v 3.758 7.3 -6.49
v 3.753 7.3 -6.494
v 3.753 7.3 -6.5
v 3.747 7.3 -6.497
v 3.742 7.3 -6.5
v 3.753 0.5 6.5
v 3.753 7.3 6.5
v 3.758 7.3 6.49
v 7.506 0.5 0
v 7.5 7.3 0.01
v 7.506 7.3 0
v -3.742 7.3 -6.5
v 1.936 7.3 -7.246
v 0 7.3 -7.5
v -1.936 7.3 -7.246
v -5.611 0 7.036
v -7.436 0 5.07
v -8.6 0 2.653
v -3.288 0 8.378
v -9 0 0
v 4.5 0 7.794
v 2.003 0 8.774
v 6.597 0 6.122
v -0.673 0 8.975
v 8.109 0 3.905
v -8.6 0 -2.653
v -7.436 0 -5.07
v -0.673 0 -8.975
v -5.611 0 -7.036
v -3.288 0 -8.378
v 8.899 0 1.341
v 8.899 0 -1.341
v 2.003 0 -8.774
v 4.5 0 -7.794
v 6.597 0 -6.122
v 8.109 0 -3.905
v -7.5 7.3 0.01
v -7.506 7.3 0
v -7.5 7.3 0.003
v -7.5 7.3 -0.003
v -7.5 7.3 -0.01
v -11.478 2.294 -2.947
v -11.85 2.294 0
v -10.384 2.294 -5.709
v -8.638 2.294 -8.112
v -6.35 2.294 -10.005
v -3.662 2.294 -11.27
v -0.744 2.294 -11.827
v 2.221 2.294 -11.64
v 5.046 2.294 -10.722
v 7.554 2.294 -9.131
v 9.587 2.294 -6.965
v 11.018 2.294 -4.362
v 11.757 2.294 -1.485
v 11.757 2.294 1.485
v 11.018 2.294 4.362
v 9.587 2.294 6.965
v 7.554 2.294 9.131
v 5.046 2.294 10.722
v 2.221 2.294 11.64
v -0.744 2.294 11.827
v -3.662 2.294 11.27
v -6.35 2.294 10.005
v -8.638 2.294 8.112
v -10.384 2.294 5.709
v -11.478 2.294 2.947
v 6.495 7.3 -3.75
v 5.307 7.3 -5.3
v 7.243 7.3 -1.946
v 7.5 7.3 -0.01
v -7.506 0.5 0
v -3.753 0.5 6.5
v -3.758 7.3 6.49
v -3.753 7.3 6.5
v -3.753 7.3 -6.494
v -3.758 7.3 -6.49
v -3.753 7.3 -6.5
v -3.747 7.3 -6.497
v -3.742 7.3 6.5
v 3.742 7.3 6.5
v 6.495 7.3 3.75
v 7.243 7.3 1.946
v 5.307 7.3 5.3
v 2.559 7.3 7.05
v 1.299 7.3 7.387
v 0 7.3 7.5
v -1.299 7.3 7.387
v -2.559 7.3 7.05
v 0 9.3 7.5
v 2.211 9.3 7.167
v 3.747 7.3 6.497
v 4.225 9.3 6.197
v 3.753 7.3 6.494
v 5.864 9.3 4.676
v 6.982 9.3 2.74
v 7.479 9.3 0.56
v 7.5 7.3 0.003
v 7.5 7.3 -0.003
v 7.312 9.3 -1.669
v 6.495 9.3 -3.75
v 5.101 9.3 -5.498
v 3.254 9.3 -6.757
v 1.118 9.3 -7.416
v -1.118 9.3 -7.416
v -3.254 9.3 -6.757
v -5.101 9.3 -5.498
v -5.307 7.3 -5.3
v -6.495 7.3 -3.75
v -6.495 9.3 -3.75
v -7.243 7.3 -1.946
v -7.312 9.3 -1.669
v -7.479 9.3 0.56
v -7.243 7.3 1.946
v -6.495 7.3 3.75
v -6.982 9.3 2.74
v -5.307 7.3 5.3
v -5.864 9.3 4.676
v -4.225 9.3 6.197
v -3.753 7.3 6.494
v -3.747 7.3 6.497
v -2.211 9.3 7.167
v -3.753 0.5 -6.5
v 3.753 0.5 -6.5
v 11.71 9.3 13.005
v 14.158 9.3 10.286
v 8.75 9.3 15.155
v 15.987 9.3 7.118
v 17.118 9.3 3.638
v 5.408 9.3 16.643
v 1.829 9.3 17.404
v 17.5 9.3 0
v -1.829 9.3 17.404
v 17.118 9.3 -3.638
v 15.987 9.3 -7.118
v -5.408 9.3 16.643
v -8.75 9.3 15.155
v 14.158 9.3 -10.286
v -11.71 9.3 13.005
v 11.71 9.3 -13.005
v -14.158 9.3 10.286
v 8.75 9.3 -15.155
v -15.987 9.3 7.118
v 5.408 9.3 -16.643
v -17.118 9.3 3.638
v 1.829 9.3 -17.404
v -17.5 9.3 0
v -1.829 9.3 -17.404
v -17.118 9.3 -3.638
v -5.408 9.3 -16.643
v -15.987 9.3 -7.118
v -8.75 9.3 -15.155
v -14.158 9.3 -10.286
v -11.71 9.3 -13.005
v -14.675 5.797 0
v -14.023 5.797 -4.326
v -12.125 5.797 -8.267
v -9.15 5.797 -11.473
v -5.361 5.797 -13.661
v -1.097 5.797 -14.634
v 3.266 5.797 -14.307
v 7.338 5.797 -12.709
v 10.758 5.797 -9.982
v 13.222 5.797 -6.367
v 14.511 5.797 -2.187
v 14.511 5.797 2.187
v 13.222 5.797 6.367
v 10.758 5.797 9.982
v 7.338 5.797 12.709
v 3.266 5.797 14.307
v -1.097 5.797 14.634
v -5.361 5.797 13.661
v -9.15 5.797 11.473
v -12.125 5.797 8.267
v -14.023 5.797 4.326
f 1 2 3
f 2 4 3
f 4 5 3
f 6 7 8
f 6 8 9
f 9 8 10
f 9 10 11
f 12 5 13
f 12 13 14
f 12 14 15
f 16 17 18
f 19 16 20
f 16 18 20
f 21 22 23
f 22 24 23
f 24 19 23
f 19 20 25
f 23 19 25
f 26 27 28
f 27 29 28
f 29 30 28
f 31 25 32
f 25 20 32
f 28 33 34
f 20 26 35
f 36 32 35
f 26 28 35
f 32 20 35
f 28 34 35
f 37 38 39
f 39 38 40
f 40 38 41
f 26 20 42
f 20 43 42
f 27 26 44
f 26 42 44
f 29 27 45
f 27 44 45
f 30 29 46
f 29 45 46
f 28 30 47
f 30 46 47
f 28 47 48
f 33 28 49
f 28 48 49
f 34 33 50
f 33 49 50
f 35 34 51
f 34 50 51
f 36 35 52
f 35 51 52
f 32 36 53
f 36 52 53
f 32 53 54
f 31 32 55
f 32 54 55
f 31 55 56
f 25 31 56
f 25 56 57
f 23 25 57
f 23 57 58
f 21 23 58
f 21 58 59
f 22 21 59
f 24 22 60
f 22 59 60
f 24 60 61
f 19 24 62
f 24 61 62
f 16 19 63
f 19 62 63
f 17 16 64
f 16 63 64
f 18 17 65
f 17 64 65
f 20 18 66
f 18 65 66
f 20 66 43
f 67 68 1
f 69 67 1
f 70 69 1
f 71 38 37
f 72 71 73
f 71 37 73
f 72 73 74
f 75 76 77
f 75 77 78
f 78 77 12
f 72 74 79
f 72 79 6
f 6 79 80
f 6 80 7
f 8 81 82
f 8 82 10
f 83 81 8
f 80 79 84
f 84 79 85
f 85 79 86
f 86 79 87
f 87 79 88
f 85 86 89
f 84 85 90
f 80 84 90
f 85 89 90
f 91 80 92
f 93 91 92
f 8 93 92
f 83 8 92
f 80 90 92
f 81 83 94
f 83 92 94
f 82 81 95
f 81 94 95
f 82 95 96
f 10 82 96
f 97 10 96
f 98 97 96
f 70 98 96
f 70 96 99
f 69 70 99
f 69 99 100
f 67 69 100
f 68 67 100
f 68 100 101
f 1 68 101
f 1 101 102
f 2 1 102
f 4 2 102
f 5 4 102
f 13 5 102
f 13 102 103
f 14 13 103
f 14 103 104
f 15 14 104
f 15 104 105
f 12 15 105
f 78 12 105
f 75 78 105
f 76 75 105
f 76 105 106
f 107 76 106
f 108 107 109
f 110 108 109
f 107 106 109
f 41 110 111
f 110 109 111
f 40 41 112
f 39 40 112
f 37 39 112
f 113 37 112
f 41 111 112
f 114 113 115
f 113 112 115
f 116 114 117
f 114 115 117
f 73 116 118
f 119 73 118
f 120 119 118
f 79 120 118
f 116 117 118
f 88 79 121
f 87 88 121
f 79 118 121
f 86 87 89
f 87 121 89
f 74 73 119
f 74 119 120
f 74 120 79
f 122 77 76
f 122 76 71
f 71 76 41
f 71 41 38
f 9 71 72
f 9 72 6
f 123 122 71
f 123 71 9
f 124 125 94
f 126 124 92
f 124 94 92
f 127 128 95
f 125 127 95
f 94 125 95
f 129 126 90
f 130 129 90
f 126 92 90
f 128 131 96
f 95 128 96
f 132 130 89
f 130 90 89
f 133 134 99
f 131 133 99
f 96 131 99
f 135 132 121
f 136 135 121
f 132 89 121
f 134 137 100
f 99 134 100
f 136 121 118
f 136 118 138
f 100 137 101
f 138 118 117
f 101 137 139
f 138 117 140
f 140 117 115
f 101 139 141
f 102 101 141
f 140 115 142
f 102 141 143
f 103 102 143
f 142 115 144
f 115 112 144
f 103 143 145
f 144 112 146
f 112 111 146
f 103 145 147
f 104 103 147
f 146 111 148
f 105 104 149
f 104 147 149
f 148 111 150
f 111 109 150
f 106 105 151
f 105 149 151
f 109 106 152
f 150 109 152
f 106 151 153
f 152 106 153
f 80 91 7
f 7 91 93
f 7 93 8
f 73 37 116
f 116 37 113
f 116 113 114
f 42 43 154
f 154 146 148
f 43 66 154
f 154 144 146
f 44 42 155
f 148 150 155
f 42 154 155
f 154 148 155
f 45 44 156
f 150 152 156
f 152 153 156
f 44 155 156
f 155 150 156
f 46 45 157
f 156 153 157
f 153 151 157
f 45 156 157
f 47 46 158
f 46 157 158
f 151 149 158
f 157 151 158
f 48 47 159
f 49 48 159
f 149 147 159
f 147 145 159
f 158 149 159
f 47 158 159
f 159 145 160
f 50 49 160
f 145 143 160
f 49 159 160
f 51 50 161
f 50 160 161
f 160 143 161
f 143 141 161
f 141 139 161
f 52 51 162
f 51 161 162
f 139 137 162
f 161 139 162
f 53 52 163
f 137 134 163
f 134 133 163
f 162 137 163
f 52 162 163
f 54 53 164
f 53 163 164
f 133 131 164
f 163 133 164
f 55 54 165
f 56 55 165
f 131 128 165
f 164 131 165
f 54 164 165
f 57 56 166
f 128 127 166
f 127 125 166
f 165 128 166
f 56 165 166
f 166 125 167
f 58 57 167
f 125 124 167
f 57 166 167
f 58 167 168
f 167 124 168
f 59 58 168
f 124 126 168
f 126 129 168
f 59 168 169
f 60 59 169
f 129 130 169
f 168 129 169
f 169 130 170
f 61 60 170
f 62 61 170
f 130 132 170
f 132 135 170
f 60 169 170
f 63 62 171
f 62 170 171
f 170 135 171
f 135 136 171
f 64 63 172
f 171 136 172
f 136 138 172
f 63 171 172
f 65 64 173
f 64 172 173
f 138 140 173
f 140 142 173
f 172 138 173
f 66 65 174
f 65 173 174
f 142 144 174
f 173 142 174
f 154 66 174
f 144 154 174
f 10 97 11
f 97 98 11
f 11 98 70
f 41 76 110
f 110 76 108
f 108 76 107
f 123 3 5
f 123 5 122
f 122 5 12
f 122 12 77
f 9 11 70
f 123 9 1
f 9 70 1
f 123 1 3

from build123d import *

# Parameters (mm, degrees)
SCHIZZO4_R               = 7.5
TAGLIO_ESTRUSIONE1_DEPTH = 2
TAGLIO_ESTRUSIONE2_DEPTH = 6.8


with BuildPart() as part:
    # Schizzo3 → Rivoluzione1 (revolve)
    with BuildSketch(Plane.XY):
        Polygon((-17.5, 9.3), (0, 9.3), (0, 0), (-9, 0), (-11.850227939, 2.294282645), align=None)
    revolve(axis=Axis((0, 9.3, 0), (0, -1, 0)))

    # Schizzo4 → Taglio-Estrusione1 (cut)
    with BuildSketch(Plane(origin=(0, 9.3, 0), x_dir=(1, 0, 0), z_dir=(0, 1, 0))):
        with Locations(Location((0, 0, 0), (0, 0, 270))):
            Circle(SCHIZZO4_R)
    extrude(amount=-TAGLIO_ESTRUSIONE1_DEPTH, mode=Mode.SUBTRACT)

    # Schizzo5 → Taglio-Estrusione2 (cut)
    with BuildSketch(Plane(origin=(0, 7.3, 0), x_dir=(1, 0, 0), z_dir=(0, 1, 0))):
        Polygon((3.75277675, -6.5), (7.505553499, 0), (3.75277675, 6.5), (-3.75277675, 6.5), (-7.505553499, 0), (-3.75277675, -6.5), align=None)
    extrude(amount=-TAGLIO_ESTRUSIONE2_DEPTH, mode=Mode.SUBTRACT)


solid = part.part
